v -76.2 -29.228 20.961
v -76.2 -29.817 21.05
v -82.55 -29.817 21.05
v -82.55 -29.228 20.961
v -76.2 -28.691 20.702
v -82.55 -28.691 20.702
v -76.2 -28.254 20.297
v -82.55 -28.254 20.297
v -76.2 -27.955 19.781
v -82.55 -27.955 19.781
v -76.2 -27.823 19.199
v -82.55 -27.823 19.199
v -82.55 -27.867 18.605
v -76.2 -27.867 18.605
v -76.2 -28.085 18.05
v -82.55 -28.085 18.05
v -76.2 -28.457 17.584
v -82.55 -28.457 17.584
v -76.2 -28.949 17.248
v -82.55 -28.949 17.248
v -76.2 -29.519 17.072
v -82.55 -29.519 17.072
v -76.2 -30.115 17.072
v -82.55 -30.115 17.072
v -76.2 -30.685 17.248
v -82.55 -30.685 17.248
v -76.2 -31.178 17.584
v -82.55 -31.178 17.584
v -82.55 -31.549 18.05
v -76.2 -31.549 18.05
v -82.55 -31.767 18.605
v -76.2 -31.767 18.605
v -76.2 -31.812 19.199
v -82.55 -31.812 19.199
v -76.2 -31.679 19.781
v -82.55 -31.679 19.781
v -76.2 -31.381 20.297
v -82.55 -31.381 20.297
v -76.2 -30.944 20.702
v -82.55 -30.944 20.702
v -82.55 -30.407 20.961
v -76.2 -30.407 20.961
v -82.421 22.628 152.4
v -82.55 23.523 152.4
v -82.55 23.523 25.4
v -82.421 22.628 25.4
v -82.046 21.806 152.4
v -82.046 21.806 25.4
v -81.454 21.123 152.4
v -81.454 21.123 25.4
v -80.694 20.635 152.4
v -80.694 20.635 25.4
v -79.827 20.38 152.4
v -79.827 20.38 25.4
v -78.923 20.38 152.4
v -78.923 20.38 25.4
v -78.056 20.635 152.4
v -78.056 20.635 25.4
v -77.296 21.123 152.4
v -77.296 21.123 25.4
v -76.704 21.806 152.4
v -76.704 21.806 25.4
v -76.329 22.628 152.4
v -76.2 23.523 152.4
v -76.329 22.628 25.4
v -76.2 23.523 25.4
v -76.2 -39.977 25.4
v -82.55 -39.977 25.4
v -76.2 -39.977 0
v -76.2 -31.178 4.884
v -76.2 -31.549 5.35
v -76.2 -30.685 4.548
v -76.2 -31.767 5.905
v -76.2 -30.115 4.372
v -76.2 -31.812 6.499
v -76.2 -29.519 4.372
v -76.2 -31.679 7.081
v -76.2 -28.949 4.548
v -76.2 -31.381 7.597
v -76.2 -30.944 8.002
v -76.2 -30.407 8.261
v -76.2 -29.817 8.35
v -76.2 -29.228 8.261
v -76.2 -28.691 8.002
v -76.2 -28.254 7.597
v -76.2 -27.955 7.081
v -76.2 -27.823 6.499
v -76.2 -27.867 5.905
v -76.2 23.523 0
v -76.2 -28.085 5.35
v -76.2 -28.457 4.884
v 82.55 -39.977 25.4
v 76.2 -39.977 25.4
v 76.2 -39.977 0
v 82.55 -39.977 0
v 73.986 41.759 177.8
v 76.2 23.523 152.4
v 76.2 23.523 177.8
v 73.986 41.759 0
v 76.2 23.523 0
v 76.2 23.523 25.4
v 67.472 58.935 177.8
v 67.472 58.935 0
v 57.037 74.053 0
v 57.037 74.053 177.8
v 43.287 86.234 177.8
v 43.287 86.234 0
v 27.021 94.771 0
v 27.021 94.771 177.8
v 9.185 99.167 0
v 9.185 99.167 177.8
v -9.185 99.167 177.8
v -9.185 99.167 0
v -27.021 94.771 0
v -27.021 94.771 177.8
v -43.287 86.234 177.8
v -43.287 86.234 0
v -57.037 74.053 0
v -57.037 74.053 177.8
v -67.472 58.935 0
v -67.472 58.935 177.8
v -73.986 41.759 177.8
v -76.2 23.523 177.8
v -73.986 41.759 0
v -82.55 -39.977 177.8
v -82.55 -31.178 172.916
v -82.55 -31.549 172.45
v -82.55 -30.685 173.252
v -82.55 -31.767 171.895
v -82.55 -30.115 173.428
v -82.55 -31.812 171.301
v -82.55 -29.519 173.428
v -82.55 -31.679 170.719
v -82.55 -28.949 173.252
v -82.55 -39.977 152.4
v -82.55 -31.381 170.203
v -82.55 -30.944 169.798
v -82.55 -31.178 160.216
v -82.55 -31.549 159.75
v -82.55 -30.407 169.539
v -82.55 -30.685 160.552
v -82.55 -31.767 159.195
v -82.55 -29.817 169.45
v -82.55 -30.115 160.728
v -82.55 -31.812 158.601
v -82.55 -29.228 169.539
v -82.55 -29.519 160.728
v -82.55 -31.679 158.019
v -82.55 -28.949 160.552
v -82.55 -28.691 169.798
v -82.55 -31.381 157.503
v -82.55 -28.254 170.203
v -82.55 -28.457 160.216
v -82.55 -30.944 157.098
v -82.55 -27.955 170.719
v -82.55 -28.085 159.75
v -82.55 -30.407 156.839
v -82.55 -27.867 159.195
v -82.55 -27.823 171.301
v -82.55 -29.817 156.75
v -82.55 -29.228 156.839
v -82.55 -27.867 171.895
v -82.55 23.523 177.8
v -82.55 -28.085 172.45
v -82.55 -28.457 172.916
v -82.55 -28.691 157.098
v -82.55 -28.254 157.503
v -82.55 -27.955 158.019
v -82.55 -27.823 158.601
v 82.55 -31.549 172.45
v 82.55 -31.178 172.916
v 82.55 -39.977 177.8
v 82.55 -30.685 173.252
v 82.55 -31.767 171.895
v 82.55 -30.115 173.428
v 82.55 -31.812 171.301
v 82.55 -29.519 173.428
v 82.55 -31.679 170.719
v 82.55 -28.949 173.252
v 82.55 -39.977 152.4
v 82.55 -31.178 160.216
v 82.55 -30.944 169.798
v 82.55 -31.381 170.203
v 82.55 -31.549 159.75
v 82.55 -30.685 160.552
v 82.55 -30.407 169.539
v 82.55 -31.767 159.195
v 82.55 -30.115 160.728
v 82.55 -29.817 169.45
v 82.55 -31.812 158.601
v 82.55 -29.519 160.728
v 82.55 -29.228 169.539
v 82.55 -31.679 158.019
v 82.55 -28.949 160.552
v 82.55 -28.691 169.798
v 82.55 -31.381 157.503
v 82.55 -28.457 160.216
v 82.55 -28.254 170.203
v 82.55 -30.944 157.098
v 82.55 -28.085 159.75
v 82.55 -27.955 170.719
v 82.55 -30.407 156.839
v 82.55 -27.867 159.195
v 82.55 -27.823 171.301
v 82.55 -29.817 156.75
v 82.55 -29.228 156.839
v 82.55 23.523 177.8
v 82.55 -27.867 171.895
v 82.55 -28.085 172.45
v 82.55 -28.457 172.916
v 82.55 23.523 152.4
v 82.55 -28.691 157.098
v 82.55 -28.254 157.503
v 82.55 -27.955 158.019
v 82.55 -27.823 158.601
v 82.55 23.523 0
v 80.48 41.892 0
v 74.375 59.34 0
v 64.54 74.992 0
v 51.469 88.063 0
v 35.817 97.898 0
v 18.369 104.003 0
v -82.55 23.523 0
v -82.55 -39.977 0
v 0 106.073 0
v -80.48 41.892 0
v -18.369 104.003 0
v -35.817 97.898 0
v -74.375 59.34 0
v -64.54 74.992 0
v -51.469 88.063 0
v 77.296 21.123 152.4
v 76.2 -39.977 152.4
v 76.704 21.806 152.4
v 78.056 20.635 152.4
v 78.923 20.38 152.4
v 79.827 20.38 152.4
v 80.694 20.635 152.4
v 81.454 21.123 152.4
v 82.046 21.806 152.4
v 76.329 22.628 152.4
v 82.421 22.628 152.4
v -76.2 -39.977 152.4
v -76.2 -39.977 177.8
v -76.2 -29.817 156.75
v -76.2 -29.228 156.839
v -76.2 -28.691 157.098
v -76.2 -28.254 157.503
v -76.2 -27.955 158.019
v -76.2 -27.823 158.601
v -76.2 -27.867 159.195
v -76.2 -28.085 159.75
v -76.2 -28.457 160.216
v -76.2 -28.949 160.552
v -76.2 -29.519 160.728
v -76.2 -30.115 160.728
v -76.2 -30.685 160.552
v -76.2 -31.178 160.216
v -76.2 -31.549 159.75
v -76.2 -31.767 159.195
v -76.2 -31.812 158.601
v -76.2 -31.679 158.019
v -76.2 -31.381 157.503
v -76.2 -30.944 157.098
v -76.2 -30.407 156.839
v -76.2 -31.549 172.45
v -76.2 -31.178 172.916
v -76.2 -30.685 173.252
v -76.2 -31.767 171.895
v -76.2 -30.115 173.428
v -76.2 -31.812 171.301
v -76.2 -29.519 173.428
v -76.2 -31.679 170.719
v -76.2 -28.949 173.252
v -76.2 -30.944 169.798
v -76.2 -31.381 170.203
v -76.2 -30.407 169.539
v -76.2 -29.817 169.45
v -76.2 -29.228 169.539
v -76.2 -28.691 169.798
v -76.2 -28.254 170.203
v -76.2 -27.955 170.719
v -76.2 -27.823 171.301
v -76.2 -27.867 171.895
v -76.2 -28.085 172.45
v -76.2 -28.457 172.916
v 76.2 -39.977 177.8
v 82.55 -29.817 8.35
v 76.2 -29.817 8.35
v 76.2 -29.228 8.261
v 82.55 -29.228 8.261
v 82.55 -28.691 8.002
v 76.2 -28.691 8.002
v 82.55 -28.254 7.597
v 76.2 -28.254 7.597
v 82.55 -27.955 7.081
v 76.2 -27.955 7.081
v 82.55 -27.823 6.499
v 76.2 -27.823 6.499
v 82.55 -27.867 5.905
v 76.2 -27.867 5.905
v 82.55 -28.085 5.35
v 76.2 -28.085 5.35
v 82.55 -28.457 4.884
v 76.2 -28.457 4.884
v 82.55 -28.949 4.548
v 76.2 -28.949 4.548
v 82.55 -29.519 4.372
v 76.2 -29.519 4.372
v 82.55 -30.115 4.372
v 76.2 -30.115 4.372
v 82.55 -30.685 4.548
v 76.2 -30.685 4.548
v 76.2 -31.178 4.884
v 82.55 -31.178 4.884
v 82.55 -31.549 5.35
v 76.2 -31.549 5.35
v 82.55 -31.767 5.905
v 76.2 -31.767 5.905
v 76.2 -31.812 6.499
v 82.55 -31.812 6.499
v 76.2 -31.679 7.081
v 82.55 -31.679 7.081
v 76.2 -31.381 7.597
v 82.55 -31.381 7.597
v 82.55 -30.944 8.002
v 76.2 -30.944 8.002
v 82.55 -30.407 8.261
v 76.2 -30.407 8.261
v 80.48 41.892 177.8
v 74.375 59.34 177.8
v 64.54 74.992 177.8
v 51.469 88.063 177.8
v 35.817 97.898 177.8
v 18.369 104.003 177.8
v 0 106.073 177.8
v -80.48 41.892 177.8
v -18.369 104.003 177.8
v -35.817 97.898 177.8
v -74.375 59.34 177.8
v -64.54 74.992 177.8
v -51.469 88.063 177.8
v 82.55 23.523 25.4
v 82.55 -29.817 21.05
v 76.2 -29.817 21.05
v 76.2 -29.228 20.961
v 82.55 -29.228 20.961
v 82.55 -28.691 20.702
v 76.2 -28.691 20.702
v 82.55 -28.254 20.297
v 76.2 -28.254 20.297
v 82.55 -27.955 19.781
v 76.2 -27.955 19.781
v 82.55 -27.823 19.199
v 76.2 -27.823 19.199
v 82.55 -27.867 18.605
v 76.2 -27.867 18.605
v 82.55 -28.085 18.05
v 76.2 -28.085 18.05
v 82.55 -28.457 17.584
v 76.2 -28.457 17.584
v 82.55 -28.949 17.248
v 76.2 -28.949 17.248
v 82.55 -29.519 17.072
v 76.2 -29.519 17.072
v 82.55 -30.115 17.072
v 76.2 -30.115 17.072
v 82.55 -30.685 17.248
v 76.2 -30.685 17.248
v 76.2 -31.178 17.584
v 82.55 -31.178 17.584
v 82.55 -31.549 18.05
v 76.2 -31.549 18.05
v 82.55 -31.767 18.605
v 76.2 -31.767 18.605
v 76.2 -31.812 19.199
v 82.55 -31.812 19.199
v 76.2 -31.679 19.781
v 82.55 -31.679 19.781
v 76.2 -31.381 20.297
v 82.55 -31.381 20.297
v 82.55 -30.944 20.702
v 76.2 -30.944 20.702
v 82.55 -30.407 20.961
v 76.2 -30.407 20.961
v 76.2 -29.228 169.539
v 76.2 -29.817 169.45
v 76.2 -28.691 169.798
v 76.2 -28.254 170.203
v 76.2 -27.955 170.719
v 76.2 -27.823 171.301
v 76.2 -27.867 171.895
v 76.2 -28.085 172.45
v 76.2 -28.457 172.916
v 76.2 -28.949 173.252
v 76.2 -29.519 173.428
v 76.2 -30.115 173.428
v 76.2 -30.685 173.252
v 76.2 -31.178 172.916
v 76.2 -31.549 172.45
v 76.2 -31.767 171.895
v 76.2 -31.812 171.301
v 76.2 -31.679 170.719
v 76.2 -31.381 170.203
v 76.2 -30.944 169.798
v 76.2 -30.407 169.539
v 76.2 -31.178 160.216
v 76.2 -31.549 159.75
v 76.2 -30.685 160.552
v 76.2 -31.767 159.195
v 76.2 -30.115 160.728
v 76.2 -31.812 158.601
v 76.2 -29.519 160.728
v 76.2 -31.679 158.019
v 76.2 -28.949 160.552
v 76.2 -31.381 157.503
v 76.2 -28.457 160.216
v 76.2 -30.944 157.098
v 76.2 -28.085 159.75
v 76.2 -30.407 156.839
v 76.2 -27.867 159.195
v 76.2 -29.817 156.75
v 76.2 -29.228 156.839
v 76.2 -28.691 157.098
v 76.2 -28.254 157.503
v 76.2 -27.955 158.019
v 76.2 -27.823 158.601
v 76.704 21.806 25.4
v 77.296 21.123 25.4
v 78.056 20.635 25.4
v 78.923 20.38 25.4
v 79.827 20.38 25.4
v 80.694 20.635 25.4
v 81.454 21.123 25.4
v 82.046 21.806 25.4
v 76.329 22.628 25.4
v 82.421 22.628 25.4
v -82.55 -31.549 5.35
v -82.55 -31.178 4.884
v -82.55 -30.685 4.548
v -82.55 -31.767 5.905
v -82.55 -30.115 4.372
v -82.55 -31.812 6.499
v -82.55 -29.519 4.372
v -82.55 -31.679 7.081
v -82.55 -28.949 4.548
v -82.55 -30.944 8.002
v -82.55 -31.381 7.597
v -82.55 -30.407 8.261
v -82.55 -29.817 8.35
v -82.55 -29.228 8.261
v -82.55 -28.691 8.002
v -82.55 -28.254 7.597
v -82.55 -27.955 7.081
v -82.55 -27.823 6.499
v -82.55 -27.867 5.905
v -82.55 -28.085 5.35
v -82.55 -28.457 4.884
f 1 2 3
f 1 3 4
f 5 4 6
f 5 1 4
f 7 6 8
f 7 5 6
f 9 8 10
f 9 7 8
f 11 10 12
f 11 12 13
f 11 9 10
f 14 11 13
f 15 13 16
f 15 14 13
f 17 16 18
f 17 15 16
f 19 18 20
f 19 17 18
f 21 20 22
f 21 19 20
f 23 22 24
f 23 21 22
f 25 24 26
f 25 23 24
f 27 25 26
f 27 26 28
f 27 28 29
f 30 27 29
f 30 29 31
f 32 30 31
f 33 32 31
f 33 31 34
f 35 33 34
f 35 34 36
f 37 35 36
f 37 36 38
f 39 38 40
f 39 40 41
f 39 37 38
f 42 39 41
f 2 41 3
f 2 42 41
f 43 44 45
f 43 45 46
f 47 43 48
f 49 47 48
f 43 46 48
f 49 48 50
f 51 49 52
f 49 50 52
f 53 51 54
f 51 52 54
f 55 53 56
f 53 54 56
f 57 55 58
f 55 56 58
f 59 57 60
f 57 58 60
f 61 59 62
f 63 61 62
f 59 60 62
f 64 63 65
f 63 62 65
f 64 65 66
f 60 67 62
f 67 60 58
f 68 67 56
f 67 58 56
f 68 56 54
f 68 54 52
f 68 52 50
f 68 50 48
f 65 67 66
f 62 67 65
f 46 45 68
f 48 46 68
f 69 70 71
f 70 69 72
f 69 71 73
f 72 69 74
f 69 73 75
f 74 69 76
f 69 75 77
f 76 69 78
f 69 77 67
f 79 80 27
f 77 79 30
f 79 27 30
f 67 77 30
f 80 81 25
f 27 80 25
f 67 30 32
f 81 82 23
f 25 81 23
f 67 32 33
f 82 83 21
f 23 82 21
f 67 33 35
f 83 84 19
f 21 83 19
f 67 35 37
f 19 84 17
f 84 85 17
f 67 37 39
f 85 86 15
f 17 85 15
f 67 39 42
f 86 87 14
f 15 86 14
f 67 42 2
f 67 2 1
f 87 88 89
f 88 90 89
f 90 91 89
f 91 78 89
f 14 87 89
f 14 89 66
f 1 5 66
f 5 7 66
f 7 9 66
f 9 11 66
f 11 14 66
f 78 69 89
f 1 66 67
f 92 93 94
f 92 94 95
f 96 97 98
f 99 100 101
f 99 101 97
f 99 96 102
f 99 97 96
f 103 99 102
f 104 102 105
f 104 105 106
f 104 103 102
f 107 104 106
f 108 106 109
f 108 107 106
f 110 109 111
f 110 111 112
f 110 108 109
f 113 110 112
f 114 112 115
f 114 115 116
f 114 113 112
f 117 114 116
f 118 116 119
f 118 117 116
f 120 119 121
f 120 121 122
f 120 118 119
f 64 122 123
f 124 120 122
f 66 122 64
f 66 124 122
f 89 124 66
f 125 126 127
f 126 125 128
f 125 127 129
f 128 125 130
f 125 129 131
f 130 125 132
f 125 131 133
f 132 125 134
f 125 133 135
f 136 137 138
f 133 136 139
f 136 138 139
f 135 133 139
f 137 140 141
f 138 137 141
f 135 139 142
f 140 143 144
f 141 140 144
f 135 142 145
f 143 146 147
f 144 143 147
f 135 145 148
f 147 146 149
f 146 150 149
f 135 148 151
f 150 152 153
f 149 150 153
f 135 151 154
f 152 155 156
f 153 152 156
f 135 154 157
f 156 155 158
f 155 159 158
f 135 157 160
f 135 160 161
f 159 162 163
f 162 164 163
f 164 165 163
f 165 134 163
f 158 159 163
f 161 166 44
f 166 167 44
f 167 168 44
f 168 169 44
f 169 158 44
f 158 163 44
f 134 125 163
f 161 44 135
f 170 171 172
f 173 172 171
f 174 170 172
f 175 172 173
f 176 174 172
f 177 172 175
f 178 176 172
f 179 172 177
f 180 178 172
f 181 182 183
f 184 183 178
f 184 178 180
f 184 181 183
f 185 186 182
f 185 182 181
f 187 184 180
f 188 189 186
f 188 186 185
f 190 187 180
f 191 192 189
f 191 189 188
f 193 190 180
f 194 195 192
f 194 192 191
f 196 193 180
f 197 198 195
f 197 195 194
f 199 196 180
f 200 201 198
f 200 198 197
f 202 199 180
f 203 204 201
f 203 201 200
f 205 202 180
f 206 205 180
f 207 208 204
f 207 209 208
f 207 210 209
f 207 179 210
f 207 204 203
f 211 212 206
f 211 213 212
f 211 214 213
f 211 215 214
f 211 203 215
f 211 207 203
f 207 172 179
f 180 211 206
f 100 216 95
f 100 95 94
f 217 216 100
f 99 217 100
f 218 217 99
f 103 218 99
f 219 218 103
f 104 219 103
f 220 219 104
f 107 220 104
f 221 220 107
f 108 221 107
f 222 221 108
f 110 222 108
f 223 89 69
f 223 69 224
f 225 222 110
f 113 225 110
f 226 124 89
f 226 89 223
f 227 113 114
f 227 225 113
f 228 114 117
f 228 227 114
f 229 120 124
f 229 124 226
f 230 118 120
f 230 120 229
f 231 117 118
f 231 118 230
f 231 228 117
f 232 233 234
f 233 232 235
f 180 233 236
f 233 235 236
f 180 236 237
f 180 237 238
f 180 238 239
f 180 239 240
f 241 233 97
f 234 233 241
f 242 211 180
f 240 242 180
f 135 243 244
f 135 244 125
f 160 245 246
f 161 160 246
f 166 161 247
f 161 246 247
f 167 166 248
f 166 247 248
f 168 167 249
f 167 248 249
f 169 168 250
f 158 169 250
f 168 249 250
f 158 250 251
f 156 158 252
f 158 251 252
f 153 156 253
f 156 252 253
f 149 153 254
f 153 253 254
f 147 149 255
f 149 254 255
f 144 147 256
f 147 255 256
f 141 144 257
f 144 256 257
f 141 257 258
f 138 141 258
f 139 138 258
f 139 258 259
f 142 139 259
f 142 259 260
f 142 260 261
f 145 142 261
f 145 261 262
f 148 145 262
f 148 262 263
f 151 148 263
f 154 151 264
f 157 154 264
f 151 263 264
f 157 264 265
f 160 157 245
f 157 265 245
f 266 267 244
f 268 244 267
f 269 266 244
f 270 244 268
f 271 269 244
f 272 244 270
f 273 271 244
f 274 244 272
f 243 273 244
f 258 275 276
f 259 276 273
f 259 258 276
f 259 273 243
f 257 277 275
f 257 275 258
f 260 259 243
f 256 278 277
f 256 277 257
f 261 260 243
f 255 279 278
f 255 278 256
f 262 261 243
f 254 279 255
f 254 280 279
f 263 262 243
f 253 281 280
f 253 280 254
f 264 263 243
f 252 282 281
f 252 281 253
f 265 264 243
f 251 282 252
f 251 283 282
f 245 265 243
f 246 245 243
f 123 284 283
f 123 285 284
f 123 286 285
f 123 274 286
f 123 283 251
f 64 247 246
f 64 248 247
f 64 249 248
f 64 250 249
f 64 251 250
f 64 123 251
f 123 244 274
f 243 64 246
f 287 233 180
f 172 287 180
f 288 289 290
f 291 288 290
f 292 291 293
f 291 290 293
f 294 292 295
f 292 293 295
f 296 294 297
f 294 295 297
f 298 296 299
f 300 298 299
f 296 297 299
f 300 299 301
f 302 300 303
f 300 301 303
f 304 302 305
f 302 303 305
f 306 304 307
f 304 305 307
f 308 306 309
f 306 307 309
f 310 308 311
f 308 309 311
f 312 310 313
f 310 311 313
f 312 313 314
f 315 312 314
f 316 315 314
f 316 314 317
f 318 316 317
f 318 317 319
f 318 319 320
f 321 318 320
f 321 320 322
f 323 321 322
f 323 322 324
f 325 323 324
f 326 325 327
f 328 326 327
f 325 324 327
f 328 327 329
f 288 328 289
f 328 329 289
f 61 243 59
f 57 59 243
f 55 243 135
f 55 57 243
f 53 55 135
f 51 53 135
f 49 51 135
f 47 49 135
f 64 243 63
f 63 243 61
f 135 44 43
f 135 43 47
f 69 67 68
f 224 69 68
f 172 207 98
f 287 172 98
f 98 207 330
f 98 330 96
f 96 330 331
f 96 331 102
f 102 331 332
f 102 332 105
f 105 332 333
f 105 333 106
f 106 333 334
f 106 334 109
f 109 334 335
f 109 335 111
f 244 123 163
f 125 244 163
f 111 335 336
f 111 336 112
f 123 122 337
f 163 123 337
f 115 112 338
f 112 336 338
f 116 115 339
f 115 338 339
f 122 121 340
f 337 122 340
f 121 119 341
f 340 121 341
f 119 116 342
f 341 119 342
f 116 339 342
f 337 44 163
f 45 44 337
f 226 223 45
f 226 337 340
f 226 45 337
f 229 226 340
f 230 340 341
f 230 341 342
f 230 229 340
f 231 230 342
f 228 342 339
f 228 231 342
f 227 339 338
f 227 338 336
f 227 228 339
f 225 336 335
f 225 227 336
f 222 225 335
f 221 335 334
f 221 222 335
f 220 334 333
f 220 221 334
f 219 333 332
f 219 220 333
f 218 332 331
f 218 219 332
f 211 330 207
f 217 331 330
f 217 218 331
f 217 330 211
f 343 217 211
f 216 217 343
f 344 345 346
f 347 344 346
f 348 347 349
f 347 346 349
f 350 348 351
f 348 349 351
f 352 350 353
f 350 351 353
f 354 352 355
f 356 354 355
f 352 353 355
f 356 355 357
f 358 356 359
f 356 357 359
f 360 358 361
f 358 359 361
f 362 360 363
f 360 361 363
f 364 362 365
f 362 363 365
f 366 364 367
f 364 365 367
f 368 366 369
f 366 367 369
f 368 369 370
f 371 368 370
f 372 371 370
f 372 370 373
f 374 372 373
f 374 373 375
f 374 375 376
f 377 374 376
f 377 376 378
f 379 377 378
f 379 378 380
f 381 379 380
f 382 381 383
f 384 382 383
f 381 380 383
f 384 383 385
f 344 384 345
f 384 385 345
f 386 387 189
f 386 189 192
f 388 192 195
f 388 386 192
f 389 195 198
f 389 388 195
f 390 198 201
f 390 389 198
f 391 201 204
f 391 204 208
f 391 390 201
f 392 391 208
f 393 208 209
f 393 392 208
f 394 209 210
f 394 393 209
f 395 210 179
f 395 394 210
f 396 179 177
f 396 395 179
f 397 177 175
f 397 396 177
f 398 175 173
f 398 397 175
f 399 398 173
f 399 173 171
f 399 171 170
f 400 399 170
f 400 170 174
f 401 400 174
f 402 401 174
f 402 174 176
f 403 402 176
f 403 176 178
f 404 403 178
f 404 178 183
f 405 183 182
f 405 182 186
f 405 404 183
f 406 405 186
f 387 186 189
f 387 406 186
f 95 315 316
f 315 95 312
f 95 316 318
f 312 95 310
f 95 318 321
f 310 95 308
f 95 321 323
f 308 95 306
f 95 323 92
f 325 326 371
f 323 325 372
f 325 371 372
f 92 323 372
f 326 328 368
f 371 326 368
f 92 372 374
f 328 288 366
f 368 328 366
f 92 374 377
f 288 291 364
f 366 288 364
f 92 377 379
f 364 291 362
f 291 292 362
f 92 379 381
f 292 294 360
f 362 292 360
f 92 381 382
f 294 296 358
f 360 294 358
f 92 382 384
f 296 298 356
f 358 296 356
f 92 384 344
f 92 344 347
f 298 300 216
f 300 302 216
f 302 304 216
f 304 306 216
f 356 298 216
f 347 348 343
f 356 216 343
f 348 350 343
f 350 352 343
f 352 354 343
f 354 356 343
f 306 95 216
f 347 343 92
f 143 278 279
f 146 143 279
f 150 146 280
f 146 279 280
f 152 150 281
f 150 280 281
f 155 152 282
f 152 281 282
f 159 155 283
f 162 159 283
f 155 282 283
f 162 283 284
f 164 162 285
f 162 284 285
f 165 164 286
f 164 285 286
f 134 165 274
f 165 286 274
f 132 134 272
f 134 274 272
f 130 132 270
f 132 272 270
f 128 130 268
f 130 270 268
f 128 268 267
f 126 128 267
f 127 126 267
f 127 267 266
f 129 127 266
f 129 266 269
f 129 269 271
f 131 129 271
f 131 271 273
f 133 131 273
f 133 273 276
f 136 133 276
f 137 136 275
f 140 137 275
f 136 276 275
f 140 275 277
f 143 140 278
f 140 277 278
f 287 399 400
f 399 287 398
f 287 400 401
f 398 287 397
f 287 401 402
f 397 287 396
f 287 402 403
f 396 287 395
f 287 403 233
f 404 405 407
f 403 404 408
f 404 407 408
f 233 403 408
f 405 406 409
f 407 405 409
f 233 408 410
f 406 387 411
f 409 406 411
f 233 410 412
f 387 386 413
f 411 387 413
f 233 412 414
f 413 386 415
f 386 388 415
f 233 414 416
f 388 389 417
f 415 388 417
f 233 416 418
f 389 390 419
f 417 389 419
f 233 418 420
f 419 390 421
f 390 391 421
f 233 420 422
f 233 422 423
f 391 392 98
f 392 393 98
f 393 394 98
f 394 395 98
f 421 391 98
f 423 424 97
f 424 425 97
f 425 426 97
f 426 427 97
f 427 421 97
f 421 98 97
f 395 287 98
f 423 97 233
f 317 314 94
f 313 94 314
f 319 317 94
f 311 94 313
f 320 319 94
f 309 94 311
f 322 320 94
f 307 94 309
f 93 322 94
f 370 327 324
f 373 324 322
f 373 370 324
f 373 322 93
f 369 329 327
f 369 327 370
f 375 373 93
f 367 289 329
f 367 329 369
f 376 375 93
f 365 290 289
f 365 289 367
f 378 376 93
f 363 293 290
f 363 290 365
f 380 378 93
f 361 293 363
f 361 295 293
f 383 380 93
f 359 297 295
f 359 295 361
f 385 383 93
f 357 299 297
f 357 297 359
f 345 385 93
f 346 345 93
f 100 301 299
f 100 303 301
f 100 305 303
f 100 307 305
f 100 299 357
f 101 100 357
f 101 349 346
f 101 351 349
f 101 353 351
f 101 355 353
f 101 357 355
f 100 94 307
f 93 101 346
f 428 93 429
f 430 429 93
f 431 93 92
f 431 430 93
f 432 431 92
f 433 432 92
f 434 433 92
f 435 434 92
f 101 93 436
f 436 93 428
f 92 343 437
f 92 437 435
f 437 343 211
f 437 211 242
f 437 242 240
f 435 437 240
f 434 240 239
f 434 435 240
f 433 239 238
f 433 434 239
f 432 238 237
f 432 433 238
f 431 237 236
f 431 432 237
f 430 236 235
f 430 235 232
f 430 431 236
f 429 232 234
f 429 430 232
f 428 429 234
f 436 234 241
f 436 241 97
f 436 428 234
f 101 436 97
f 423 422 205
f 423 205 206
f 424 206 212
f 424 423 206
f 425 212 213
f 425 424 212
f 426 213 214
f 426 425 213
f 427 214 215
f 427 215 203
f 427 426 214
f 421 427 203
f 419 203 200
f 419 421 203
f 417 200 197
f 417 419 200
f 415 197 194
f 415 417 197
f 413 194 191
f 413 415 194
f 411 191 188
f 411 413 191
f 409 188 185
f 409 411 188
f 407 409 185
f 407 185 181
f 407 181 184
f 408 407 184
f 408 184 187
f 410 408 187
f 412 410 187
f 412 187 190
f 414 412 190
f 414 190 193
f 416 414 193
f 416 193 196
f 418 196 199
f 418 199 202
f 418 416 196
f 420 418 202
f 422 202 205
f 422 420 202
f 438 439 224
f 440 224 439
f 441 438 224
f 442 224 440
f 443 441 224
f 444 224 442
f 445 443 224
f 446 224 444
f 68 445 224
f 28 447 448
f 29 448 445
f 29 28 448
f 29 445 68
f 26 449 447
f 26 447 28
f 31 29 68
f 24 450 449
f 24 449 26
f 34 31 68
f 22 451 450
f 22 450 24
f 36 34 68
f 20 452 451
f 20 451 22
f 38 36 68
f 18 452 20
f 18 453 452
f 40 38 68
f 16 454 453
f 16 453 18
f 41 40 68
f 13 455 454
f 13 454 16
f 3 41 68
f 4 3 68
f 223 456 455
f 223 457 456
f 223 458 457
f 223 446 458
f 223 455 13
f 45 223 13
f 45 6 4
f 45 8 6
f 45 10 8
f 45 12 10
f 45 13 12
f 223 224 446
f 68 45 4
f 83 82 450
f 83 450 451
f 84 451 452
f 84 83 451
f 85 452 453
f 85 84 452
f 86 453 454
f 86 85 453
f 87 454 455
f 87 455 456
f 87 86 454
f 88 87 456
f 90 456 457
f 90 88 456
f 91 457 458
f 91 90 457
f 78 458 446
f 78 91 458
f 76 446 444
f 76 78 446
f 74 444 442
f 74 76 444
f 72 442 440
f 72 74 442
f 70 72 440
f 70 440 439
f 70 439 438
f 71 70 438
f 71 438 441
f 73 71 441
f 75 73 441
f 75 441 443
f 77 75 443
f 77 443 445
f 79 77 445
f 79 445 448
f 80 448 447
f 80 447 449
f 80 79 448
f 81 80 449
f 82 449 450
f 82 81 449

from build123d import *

# Parameters (mm, degrees)
EXTRUDE_THIN1_DEPTH     = 177.8
SKETCH7_W               = 6.35
SKETCH7_H               = 25.4
BOSS_EXTRUDE2_DEPTH     = 63.5
SKETCH11_R              = 2
CUT_EXTRUDE1_DEPTH      = 6.35
MIRROR2_COPY_1_SKETCH_W = 6.35
MIRROR2_COPY_1_SKETCH_H = 25.4
MIRROR2_COPY_1_DEPTH    = 63.5
MIRROR2_COPY_2_SKETCH_R = 2
MIRROR2_COPY_2_DEPTH    = 6.35
BOSS_EXTRUDE3_DEPTH     = 127


with BuildPart() as part:
    # Sketch2 → Extrude-Thin1 (new body)
    with BuildSketch(Plane.XY):
        with BuildLine():
            ThreePointArc((76.2, 23.522786699), (0, 99.722786699), (-76.2, 23.522786699))
            Line((-76.2, 23.522786699), (-82.55, 23.522786699))
            ThreePointArc((-82.55, 23.522786699), (0, 106.072786699), (82.55, 23.522786699))
            Line((82.55, 23.522786699), (76.2, 23.522786699))
        make_face()
    extrude(amount=EXTRUDE_THIN1_DEPTH)

    # Sketch7 → Boss-Extrude2 (add)
    with BuildSketch(Plane.XZ.offset(-23.522786699)):
        with Locations((79.375, 12.7)):
            Rectangle(SKETCH7_W, SKETCH7_H)
    boss_extrude2 = extrude(amount=BOSS_EXTRUDE2_DEPTH)

    # Sketch11 → Cut-Extrude1 (cut)
    with BuildSketch(Plane.ZY.offset(-76.2)):
        with Locations((6.35, -29.817213301)):
            Circle(SKETCH11_R)
        with Locations((19.05, -29.817213301)):
            Circle(SKETCH11_R)
    cut_extrude1 = extrude(amount=-CUT_EXTRUDE1_DEPTH, mode=Mode.SUBTRACT)

    # Mirror1: Boss-Extrude2, Cut-Extrude1 across plane
    add(boss_extrude2.mirror(Plane.XY.offset(88.9)))
    add(cut_extrude1.mirror(Plane.XY.offset(88.9)), mode=Mode.SUBTRACT)

    # Mirror2: Boss-Extrude2, Cut-Extrude1 across plane
    add(boss_extrude2.mirror(Plane(origin=(0, 0, 0), x_dir=(0, 0, 1), z_dir=(1, 0, 0))))
    add(cut_extrude1.mirror(Plane(origin=(0, 0, 0), x_dir=(0, 0, 1), z_dir=(1, 0, 0))), mode=Mode.SUBTRACT)

    # Mirror2 copy 1 sketch → Mirror2 copy 1 (add)
    with BuildSketch(Plane(origin=(0, 23.522786699, 177.8), x_dir=(-1, 0, 0), z_dir=(0, -1, 0))):
        with Locations((79.375, 12.7)):
            Rectangle(MIRROR2_COPY_1_SKETCH_W, MIRROR2_COPY_1_SKETCH_H)
    extrude(amount=MIRROR2_COPY_1_DEPTH)

    # Mirror2 copy 2 sketch → Mirror2 copy 2 (cut)
    with BuildSketch(Plane(origin=(-76.2, 0, 177.8), x_dir=(0, 0, -1), z_dir=(1, 0, 0))):
        with Locations((6.35, -29.817213301)):
            Circle(MIRROR2_COPY_2_SKETCH_R)
        with Locations((19.05, -29.817213301)):
            Circle(MIRROR2_COPY_2_SKETCH_R)
    extrude(amount=-MIRROR2_COPY_2_DEPTH, mode=Mode.SUBTRACT)

    # Sketch15 → Boss-Extrude3 (add)
    with BuildSketch(Plane.XY.offset(25.4)):
        with BuildLine():
            Line((76.2, 23.522786699), (82.55, 23.522786699))
            ThreePointArc((82.55, 23.522786699), (79.375, 20.347786699), (76.2, 23.522786699))
        make_face()
    boss_extrude3 = extrude(amount=BOSS_EXTRUDE3_DEPTH)

    # Mirror3: Boss-Extrude3 across plane
    add(boss_extrude3.mirror(Plane(origin=(0, 0, 0), x_dir=(0, 0, 1), z_dir=(1, 0, 0))))


solid = part.part
